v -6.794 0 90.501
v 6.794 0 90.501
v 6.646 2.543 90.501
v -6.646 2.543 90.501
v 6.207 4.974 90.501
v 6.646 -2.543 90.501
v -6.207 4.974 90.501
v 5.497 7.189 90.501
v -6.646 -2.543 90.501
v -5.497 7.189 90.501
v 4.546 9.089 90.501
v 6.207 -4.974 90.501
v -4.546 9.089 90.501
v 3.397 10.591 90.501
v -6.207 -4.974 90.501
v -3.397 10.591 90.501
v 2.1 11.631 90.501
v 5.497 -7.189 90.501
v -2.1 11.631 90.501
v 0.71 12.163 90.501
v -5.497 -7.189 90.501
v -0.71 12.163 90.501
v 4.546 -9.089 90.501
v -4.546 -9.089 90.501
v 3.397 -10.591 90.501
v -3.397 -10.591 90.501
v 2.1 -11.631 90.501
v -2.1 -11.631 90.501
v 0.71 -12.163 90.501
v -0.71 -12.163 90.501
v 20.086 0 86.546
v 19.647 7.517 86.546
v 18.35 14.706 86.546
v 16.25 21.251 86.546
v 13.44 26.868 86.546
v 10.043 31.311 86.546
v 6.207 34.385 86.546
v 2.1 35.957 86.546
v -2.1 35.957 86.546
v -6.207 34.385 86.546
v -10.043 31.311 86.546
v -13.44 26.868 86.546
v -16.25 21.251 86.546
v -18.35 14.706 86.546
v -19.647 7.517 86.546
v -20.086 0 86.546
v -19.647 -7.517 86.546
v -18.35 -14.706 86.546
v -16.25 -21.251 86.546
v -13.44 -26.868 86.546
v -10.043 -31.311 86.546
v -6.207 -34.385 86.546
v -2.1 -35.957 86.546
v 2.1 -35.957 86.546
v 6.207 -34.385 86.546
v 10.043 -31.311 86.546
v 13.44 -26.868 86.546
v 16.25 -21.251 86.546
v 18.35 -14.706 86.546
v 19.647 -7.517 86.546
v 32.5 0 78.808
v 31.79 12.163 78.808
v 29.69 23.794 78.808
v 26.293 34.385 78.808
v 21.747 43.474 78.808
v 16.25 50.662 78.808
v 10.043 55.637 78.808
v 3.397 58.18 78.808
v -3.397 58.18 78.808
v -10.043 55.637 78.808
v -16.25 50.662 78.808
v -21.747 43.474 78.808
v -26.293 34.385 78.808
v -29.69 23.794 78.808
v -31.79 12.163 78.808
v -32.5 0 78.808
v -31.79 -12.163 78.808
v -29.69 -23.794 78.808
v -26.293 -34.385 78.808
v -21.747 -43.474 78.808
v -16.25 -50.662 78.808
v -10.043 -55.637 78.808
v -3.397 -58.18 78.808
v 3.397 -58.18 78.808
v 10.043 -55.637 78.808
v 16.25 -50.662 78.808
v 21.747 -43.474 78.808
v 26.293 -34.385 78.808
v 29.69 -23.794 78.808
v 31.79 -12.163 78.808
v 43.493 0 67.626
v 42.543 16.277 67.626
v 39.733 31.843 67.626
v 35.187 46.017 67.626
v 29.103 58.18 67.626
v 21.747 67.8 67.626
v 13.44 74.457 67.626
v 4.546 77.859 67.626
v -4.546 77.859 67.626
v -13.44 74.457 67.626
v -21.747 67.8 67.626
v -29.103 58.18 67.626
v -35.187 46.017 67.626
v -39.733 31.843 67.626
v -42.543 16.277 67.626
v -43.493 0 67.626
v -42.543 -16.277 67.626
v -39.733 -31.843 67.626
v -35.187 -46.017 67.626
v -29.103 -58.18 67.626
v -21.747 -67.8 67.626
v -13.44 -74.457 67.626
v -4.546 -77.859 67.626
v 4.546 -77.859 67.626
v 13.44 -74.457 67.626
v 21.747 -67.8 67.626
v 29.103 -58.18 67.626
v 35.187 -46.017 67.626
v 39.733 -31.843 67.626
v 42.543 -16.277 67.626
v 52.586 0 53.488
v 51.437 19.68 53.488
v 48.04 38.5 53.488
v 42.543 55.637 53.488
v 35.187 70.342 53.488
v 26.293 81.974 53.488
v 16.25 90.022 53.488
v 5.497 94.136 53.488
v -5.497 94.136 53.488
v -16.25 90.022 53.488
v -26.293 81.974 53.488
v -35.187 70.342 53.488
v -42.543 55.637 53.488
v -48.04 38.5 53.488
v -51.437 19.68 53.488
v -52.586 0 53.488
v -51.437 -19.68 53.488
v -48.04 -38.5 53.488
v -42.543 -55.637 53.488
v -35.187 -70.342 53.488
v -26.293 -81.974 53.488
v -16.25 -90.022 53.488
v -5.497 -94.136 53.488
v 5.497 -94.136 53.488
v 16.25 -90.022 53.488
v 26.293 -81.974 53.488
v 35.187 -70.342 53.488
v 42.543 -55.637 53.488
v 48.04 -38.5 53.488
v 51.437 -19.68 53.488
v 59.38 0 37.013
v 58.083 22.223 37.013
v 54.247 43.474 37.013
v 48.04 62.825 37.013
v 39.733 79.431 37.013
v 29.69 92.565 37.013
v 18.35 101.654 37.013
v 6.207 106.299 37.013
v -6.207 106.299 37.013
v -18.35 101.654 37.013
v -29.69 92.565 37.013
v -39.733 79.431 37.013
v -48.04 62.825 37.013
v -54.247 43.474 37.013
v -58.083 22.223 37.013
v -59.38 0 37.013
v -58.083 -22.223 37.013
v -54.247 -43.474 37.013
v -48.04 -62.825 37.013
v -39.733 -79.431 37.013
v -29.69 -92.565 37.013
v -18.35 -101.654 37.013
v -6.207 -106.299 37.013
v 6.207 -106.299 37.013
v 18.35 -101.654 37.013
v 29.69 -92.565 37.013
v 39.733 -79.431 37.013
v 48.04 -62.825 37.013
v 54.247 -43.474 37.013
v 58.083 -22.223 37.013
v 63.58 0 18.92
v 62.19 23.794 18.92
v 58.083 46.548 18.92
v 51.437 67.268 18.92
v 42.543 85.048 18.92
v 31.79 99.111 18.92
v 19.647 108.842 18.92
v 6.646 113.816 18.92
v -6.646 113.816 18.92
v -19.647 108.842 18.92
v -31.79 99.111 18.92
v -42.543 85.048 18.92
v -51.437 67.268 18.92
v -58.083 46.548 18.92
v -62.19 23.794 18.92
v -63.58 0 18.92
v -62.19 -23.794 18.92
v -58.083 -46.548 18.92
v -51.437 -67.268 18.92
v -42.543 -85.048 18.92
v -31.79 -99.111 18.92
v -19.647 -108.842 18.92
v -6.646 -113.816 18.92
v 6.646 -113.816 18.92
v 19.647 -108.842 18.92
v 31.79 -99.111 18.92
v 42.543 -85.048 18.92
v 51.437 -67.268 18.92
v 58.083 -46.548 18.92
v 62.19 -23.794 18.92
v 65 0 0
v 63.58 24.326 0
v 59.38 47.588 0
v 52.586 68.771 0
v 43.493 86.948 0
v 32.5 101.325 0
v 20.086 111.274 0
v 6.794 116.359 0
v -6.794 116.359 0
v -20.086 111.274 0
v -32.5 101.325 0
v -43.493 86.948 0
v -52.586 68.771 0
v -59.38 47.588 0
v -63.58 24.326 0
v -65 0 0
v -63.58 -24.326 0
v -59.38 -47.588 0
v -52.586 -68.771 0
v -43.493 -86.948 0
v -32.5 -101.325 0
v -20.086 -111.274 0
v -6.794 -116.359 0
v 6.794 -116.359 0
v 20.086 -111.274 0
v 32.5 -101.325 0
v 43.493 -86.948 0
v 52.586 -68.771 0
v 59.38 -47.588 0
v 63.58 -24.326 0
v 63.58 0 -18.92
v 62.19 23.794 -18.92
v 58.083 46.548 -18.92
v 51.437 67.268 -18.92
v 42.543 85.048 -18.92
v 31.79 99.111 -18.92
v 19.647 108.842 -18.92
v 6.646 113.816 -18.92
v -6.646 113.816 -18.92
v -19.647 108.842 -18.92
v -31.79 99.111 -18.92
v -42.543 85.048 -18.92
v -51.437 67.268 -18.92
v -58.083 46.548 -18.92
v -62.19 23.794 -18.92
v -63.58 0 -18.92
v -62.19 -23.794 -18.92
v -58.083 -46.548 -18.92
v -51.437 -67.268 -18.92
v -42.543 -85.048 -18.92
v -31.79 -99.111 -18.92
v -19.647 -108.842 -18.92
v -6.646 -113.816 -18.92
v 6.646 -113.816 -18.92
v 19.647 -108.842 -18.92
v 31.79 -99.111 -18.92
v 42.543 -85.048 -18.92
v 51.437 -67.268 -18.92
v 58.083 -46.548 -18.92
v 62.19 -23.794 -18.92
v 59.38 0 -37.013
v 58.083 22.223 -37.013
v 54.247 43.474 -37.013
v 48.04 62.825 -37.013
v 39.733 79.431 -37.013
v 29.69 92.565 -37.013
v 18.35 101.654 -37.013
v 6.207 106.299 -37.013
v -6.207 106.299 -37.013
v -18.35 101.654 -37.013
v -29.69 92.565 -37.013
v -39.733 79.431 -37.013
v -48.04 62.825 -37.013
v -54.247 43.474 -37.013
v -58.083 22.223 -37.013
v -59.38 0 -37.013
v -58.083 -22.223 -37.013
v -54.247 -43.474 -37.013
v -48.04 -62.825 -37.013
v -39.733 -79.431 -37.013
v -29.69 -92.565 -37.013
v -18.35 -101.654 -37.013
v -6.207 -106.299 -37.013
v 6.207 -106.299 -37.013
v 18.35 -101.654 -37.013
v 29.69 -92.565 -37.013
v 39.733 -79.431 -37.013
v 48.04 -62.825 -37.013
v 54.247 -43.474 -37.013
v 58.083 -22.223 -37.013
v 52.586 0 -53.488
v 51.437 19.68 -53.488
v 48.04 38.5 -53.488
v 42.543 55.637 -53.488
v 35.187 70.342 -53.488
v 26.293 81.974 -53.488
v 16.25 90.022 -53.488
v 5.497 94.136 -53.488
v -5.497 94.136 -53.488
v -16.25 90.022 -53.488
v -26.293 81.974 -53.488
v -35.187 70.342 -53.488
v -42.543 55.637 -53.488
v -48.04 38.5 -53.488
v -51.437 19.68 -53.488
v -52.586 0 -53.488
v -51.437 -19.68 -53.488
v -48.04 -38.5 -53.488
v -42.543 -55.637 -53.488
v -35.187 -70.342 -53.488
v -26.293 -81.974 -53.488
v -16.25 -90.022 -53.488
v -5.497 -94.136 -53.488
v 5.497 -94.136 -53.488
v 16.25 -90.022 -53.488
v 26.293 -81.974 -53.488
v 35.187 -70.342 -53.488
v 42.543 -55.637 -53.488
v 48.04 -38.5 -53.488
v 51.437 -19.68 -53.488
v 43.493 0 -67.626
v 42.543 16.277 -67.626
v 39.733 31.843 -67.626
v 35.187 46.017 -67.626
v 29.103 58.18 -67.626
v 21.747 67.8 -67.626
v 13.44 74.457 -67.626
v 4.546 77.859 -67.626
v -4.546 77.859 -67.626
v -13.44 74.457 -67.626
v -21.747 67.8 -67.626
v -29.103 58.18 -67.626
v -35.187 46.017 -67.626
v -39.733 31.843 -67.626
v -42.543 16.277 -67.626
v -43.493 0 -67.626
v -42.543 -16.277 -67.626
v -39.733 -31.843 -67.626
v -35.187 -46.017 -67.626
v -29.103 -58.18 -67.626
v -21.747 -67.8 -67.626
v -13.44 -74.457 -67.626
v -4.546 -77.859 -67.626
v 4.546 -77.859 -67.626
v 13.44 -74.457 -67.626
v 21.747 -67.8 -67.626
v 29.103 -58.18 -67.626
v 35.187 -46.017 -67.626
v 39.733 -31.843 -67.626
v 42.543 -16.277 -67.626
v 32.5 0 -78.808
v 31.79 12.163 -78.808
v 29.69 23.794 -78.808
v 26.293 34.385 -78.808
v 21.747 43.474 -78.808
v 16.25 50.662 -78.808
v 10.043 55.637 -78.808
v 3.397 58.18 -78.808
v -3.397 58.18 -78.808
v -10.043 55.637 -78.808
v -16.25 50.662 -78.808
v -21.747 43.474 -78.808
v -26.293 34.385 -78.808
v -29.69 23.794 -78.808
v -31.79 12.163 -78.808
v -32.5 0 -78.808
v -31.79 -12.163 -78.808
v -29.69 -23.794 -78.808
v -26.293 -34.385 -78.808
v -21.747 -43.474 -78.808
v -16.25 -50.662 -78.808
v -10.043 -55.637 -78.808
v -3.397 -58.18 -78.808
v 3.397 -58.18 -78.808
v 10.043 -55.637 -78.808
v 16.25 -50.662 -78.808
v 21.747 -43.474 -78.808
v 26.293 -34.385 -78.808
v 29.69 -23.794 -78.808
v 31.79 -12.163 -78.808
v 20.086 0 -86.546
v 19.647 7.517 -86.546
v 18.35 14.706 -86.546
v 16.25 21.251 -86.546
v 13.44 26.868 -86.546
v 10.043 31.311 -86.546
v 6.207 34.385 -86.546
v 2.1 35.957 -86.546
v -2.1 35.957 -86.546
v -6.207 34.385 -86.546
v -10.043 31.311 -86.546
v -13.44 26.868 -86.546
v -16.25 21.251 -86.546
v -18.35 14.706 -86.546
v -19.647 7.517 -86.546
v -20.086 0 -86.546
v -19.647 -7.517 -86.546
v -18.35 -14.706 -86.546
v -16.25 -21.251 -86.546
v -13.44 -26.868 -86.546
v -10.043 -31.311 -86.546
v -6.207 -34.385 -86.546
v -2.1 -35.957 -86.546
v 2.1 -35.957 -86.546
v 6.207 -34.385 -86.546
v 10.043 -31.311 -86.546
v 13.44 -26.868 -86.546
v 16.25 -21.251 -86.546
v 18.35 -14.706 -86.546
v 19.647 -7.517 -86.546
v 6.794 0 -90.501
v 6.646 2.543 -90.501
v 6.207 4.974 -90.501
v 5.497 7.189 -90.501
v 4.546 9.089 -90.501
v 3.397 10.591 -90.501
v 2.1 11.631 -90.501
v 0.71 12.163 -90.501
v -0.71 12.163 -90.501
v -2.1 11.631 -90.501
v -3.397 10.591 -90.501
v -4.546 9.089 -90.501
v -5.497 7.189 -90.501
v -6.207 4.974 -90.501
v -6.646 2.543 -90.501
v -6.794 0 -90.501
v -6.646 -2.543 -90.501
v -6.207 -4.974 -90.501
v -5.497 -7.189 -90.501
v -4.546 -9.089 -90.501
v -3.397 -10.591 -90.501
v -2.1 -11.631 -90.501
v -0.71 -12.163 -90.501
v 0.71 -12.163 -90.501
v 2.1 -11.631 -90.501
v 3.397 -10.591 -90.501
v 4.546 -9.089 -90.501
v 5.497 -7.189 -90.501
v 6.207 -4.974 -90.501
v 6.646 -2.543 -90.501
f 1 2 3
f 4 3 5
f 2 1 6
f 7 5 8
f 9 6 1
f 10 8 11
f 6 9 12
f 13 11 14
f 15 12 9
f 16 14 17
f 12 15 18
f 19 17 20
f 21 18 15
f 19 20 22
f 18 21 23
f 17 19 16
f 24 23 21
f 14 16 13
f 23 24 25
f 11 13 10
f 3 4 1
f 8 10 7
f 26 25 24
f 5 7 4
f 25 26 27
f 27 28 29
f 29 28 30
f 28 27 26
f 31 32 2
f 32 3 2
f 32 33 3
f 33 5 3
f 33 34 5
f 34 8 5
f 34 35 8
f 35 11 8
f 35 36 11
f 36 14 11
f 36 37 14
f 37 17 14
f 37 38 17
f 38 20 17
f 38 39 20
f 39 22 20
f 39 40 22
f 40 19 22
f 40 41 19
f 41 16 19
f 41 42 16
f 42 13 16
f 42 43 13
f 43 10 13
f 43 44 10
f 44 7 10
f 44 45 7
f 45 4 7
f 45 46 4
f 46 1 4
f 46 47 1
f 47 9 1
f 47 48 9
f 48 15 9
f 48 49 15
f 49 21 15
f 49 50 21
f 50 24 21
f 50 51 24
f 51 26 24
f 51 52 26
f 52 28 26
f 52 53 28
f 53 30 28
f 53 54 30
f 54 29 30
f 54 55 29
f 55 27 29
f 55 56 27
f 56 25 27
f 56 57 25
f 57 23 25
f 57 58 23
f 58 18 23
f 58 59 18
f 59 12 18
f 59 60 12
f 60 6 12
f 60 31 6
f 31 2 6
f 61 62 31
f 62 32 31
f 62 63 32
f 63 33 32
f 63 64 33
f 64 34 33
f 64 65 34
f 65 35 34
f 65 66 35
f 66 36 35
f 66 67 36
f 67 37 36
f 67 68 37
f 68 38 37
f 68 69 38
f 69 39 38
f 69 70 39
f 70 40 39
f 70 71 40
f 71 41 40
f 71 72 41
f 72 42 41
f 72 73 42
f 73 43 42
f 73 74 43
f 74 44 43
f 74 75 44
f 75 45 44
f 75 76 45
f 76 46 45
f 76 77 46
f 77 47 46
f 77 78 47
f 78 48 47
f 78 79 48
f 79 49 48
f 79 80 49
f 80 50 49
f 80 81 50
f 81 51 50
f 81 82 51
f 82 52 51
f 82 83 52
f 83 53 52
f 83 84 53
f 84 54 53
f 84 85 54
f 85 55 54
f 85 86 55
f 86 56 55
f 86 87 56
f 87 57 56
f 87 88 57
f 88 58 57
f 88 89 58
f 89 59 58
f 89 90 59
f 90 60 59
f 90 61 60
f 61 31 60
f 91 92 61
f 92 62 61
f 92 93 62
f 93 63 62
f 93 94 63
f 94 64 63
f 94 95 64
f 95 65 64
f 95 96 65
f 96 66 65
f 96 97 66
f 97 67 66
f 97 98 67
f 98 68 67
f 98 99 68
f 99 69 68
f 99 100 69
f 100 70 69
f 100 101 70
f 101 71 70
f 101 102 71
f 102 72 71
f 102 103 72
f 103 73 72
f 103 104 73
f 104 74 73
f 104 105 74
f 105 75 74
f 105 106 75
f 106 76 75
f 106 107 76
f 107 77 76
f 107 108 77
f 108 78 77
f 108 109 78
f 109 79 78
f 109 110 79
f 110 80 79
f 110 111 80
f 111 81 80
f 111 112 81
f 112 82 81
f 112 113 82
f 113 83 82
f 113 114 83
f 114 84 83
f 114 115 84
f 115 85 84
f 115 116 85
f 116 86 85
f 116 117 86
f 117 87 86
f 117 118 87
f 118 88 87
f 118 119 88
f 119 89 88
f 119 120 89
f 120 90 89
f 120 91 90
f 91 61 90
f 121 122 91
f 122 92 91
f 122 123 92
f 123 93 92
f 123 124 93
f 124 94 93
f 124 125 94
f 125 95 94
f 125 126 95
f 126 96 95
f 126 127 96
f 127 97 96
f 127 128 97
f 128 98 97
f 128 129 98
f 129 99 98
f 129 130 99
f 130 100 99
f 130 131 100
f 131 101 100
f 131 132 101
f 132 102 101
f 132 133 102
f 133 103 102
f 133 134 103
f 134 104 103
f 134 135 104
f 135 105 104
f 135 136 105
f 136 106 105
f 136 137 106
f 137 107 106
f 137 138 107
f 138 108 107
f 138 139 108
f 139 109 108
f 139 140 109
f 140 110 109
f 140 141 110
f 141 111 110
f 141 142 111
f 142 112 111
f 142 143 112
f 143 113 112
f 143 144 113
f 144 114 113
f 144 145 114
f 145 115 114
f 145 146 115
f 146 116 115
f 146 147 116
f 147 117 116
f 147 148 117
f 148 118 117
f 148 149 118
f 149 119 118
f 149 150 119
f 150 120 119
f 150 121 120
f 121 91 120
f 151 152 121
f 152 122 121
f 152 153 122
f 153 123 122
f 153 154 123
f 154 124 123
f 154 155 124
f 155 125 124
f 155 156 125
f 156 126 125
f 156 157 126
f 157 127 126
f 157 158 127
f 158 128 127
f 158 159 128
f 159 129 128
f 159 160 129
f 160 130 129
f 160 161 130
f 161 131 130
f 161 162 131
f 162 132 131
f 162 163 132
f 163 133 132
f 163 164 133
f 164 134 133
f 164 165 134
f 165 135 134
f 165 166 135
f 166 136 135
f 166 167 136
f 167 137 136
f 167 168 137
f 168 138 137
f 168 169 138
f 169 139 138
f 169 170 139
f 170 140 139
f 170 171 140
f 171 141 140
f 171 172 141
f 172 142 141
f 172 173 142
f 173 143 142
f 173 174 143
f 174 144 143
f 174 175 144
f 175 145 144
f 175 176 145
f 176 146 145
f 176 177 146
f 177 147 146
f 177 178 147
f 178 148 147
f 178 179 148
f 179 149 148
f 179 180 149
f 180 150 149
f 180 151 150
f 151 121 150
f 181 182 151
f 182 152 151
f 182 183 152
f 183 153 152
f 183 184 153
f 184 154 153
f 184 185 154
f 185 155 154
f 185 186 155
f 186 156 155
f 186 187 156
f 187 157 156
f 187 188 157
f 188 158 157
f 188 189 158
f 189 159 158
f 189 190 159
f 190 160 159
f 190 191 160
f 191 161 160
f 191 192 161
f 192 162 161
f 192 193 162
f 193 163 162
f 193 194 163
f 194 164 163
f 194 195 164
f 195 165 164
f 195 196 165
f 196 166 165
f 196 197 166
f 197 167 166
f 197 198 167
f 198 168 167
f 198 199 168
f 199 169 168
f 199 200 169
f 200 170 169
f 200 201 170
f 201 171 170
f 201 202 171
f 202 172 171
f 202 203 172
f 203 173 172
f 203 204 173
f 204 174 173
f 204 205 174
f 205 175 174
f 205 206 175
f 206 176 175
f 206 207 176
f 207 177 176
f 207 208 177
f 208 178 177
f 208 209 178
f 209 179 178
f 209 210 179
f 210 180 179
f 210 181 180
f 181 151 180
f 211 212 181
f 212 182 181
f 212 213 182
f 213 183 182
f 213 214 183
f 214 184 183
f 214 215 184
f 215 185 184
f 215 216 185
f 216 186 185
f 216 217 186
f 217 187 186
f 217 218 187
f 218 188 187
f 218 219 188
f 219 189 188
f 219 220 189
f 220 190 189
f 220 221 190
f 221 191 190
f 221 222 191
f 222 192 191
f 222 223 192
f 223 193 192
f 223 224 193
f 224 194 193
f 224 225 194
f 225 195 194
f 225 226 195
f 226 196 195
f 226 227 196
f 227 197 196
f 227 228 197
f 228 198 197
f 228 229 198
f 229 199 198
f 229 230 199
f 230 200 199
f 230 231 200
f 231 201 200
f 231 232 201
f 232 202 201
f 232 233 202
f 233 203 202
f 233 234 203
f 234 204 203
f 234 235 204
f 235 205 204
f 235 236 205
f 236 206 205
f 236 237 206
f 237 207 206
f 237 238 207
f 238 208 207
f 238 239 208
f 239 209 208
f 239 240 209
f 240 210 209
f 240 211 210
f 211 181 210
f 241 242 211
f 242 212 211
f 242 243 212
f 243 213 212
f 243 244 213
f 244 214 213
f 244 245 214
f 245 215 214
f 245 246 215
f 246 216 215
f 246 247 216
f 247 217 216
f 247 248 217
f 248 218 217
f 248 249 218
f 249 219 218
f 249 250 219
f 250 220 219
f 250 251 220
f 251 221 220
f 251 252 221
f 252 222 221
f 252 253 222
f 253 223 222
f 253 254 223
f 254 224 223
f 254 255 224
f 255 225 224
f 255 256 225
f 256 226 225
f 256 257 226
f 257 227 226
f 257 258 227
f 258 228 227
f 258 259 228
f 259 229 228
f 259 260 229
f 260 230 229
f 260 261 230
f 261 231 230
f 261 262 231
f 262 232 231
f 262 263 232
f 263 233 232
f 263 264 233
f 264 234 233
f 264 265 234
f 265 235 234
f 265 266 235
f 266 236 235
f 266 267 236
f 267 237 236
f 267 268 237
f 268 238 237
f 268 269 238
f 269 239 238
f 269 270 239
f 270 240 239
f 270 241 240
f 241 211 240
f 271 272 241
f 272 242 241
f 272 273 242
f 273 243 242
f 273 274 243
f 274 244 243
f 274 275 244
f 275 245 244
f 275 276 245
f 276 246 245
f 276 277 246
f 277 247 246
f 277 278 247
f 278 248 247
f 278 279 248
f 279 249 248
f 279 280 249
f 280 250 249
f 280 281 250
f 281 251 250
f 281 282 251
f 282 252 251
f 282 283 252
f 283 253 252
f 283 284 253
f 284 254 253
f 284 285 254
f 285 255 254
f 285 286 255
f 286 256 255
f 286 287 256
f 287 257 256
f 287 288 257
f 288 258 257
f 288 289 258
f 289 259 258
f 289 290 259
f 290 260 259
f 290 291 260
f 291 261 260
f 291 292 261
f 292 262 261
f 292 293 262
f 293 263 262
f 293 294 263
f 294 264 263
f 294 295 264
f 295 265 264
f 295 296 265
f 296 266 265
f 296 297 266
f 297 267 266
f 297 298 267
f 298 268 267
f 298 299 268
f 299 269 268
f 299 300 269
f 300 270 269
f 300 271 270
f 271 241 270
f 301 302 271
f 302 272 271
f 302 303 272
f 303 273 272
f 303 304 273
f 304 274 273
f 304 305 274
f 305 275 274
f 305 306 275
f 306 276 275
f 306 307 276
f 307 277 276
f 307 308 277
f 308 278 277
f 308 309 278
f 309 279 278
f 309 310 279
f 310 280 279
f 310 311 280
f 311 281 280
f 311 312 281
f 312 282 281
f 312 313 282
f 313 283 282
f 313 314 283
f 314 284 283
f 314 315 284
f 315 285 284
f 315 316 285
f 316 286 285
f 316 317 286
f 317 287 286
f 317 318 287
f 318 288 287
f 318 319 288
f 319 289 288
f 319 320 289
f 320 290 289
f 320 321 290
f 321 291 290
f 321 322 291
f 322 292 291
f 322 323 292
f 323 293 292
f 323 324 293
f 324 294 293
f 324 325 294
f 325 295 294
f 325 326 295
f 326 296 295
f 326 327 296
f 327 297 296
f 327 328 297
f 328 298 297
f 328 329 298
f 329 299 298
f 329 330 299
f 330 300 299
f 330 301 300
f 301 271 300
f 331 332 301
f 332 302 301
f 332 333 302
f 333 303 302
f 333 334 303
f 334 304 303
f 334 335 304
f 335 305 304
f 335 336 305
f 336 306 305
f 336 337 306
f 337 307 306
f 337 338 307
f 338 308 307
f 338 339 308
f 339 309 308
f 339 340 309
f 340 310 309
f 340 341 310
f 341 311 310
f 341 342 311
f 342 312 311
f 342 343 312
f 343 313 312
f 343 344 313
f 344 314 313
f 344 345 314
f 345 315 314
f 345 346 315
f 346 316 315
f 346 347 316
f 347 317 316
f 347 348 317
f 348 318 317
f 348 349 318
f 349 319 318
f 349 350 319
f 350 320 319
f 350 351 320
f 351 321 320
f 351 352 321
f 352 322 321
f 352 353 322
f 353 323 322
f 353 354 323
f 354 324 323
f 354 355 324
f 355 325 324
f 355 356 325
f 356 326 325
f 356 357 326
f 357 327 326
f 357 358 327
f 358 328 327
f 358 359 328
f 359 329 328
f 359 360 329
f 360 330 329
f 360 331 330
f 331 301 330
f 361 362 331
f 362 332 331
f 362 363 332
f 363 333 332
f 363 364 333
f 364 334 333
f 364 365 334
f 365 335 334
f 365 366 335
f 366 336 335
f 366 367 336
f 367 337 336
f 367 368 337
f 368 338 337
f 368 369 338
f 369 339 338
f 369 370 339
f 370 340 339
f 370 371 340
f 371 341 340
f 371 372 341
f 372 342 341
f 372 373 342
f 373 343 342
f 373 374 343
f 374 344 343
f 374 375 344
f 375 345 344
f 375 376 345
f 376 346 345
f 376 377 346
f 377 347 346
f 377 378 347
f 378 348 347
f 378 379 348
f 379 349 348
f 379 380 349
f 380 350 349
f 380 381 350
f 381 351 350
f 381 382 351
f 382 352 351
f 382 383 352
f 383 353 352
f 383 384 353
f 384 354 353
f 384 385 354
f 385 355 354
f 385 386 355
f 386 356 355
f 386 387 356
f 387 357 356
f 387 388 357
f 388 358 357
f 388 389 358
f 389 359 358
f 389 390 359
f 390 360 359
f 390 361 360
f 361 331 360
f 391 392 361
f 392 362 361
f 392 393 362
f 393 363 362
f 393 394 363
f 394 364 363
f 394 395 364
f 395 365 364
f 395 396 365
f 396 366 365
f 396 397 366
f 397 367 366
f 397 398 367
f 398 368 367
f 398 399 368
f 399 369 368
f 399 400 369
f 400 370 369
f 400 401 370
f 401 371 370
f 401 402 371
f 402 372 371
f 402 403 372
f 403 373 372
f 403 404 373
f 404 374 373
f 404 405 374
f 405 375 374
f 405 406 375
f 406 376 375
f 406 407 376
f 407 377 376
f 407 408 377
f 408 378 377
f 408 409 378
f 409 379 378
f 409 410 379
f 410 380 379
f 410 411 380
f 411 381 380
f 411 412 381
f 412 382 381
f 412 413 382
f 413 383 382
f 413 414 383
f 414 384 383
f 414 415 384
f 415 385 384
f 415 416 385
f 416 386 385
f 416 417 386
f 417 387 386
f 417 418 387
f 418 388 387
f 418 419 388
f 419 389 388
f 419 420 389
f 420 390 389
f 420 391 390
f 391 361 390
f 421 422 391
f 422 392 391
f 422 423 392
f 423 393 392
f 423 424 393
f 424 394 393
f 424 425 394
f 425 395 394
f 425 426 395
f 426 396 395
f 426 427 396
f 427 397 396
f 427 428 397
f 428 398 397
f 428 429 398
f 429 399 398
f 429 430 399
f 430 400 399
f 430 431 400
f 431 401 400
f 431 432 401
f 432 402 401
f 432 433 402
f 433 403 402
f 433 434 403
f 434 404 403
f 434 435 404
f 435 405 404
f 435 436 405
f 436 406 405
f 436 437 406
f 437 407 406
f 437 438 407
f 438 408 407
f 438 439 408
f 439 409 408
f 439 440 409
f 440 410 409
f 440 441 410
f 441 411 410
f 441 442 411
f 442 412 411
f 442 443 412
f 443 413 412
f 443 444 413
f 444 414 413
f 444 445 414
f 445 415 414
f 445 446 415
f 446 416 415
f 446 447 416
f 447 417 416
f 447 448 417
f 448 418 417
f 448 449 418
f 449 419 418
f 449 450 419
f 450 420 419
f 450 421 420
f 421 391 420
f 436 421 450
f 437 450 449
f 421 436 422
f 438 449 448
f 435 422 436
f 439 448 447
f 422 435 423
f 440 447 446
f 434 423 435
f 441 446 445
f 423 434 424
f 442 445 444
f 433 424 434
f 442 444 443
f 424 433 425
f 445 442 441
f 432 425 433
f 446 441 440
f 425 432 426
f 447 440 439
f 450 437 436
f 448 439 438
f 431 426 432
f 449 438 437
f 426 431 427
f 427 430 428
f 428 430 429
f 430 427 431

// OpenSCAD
// Generated by SolidPython 1.0.1 on 2020-07-29 00:46:46


scale(v = [5, 9, 7]) {
	sphere(r = 13);
}
/***********************************************
*********      SolidPython code:      **********
************************************************
 
# import packages: SolidPython
from solid import *
from solid.utils import *
from itertools import chain, combinations, permutations


class Resize:

    def __init__(self, scad_file):
        self.scad_file = scad_file
        #self.scad_file = import_scad(scad_file)
        # cone/cylinder param:
        self.r1 = 0
        self.r2 = 0
        self.h = 0
        # rectangular prism param:
        self.w = 0
        self.l = 0
        # ellipse param:
        self.r = 0

    # import OpenScad code (file name corresponds to shape)


    # classify shape + parameters
    def assign(self, param1, param2, param3):
        if self.scad_file == 'cone.scad':
            self.r1 = param1
            self.r2 = param2
            self.h = param3
        elif self.scad_file == 'cylinder.scad':
            self.r1 = param1
            self.r2 = param2
            self.h = param3
        elif self.scad_file == 'rectangularPrism.scad':
            self.h = param1
            self.l = param2
            self.w = param3
        else:
            self.r = param1
            self.h = param2

    # resize parameters
    def iterate(self):
        x = range(3, 20, 2)
        i = 1
        if self.scad_file == 'cone.scad':
            tempList = list(permutations(x, 2))
            for temp in tempList:
                param1 = temp[0]
                param2 = temp[1]
                filepath = 'produced_scad_files/' + 'cone' + str(param1) + '_' + str(param2) + '_' + '.scad'
                scad_render_to_file(cylinder(h=param1, r1=param2, r2=0), filepath)

        elif self.scad_file == 'cylinder.scad':
            tempList = list(permutations(x, 3))
            for temp in tempList:
                param1 = temp[0]
                param2 = temp[1]
                filepath = 'produced_scad_files/' + 'cylinder' + str(param1) + '_' + str(param2) + '_' + '.scad'
                scad_render_to_file(cylinder(h=param1, r1=param2, r2=param2), filepath)

        elif self.scad_file == 'rectangularPrism.scad':
            tempList = list(permutations(x, 3))
            for temp in tempList:
                param1 = temp[0]
                param2 = temp[1]
                param3 = temp[2]
                filepath = 'produced_scad_files/' + 'rectangularPrism' + str(param1) + '_' + str(param2) + '_' + str(
                    param3) + '.scad'
                scad_render_to_file(cube(size=(param1, param2, param3)), filepath)

        elif self.scad_file == 'ellipse.scad':
            tempList = list(permutations(x, 4))
            for temp in tempList:
                param1 = temp[0]
                param2 = temp[1]
                param3 = temp[2]
                param4 = temp[3]
                filepath = 'produced_scad_files/' + 'ellipse' + str(param1) + '_' + str(param2) + '_' + str(param3) + '_' + str(param4) + '.scad'
                scad_render_to_file(scale([param1, param2, param3])(sphere(r=param4)), filepath)

    def render_to_scadfile(self):
        scad_render_to_file(scad, 'example.scad') 
 
************************************************/
